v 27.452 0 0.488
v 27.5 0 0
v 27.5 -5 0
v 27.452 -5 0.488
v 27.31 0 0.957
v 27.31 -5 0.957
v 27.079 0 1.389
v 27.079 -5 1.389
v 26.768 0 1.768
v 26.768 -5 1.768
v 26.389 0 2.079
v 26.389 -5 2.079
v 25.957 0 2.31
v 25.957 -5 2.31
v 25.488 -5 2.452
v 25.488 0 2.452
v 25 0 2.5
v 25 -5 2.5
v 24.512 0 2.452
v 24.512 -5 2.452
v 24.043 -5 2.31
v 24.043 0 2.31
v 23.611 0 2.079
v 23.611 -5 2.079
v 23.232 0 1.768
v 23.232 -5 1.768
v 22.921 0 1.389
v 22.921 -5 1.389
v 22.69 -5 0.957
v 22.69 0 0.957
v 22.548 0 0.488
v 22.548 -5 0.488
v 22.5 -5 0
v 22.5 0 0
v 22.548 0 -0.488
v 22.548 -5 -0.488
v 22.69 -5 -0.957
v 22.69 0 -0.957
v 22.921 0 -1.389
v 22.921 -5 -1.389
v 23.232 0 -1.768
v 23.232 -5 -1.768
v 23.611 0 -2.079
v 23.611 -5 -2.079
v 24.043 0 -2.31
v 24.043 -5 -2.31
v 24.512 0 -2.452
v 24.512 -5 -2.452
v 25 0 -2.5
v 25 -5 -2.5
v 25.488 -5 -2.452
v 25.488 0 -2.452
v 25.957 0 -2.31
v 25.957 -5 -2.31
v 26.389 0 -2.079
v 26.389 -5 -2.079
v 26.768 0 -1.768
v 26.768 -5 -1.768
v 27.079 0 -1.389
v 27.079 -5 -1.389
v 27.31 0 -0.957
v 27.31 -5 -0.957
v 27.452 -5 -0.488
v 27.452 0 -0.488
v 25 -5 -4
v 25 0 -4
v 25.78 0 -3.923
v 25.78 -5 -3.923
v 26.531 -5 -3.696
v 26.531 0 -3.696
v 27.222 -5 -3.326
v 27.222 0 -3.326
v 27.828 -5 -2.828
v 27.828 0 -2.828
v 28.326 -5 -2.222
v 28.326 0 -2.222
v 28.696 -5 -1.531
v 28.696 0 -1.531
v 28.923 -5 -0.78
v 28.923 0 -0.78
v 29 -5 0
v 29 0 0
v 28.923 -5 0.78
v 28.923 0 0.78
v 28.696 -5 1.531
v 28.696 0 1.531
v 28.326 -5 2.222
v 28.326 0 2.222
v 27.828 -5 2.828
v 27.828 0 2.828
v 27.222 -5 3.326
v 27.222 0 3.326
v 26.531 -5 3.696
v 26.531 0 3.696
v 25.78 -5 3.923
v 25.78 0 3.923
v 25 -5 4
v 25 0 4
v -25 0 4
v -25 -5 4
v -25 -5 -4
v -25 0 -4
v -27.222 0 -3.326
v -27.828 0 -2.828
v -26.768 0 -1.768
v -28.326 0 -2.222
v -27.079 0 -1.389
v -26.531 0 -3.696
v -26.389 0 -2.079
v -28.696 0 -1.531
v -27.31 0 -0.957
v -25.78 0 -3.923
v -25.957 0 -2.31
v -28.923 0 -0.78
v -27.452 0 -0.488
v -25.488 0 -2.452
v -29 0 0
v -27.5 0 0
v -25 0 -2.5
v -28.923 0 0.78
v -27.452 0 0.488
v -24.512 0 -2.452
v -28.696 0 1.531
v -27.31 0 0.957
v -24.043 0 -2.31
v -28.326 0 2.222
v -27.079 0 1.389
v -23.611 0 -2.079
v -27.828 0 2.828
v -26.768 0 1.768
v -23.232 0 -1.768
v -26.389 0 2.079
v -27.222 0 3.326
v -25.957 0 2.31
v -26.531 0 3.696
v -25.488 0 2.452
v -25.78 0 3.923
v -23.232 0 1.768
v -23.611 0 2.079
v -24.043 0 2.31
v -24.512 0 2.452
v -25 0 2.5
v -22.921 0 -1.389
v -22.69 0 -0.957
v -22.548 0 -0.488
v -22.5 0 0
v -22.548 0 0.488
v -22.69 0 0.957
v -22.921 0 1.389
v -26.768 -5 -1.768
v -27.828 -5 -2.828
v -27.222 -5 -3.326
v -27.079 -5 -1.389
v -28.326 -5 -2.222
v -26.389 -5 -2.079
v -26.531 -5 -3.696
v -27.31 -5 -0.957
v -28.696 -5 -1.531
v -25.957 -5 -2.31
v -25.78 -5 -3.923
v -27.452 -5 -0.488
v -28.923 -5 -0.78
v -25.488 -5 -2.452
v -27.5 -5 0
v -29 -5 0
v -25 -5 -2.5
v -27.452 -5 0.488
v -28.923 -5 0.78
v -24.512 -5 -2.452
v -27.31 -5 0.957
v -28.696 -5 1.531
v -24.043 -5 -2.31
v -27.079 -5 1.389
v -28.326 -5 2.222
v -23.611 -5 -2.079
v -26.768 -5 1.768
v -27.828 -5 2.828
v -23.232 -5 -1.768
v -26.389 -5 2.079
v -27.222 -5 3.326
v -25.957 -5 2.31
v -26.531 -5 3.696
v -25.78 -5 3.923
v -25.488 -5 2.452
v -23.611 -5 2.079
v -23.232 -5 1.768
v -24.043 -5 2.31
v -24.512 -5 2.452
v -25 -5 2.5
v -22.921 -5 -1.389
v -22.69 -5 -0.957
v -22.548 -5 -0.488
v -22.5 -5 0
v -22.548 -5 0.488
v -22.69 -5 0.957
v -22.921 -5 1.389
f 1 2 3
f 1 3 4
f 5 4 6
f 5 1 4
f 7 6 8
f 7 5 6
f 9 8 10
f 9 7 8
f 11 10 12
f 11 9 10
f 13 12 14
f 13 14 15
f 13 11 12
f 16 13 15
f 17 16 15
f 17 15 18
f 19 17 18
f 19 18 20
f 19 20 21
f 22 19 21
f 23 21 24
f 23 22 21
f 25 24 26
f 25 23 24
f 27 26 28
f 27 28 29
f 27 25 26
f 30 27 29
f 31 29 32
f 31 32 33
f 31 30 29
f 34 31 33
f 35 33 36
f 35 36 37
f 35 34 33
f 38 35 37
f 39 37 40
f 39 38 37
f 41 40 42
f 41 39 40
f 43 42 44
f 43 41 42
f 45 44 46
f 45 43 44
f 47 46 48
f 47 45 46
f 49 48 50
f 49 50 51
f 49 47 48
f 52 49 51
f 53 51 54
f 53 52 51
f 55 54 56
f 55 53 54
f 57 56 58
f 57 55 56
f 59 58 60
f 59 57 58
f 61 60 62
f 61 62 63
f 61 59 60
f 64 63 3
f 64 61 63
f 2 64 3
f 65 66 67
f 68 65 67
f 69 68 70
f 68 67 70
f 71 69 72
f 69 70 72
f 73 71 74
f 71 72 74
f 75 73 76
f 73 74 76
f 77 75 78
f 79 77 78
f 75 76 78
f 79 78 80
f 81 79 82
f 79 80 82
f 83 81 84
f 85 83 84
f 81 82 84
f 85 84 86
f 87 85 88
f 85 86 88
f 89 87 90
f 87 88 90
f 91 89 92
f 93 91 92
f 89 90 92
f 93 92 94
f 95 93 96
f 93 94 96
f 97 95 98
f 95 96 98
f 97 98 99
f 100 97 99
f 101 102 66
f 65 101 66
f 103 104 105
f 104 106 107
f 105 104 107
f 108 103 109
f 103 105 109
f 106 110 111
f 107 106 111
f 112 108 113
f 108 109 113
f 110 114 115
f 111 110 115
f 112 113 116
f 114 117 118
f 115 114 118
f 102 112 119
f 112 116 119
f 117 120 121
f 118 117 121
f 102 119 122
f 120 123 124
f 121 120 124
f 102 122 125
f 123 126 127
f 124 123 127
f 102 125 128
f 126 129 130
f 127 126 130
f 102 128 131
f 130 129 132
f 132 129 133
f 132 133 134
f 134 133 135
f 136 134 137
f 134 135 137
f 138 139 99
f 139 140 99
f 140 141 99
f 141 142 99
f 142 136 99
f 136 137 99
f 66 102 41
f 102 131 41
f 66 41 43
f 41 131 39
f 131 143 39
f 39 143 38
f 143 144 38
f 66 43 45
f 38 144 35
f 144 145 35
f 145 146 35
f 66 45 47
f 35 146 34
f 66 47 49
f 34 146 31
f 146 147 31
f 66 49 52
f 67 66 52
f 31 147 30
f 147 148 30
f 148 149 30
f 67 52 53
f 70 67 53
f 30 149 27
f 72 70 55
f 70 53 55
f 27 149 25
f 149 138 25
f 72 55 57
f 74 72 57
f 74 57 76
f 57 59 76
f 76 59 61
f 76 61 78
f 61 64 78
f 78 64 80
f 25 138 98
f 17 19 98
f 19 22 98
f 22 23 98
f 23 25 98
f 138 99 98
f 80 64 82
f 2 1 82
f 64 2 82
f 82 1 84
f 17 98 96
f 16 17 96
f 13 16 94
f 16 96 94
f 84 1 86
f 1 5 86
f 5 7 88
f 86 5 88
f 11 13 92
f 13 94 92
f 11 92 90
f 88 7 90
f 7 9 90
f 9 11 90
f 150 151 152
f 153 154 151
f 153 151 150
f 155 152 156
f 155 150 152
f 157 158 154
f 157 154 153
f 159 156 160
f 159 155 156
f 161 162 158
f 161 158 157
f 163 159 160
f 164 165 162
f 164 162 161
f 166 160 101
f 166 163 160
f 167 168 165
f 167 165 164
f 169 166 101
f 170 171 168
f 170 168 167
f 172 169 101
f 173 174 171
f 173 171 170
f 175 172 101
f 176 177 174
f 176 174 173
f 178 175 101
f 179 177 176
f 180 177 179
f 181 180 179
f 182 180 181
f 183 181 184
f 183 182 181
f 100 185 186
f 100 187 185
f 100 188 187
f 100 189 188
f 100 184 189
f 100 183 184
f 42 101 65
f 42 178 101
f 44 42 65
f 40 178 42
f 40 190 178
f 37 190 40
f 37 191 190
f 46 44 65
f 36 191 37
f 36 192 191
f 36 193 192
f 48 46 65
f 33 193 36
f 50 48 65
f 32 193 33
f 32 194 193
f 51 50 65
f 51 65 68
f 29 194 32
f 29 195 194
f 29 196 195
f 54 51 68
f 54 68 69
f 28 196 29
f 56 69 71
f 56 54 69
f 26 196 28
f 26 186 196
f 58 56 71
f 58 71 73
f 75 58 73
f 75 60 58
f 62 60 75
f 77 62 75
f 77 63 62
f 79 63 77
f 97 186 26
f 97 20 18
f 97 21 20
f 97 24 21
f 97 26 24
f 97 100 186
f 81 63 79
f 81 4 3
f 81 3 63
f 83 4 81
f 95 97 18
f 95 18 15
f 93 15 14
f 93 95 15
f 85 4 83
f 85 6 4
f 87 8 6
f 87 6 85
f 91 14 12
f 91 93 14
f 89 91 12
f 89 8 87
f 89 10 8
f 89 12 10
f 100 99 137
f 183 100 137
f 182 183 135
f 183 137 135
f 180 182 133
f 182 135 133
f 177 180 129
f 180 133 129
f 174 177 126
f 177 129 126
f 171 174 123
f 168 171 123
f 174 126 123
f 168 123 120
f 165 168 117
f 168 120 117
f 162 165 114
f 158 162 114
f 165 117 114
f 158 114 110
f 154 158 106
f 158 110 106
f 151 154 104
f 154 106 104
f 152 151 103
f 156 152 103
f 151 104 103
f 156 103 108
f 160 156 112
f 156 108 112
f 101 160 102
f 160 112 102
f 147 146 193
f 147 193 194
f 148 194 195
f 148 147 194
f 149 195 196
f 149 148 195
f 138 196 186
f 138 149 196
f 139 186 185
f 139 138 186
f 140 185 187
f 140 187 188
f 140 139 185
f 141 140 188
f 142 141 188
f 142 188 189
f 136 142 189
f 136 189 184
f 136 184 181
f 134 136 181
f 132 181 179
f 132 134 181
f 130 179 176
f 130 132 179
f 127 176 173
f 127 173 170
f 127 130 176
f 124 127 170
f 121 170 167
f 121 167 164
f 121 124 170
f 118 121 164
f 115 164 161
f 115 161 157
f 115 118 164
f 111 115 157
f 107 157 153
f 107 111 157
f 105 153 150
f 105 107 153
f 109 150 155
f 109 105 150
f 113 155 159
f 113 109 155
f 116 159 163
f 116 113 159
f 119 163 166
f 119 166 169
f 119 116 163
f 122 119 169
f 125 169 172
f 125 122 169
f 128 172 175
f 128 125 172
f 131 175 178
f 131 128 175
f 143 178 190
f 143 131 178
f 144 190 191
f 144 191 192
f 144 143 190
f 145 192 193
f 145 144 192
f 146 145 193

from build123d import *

# Parameters (mm, degrees)
F0_R     = 2.5
F1_DEPTH = 5


with BuildPart() as f1:
    # F0 (on Front) → F1 (new body)
    with BuildSketch(Plane.XZ):
        with BuildLine():
            Line((0, 4), (-25, 4))
            ThreePointArc((-25, 4), (-29, 0), (-25, -4))
            Line((-25, -4), (0, -4))
            Line((0, -4), (0, 4))
        make_face()
        with Locations((-25, 0)):
            Circle(F0_R, mode=Mode.SUBTRACT)
        with BuildLine():
            Line((25, 4), (0, 4))
            Line((0, 4), (0, -4))
            Line((0, -4), (25, -4))
            ThreePointArc((25, -4), (29, 0), (25, 4))
        make_face()
        with Locations((25, 0)):
            Circle(F0_R, mode=Mode.SUBTRACT)
    extrude(amount=F1_DEPTH)


solid = f1.part
